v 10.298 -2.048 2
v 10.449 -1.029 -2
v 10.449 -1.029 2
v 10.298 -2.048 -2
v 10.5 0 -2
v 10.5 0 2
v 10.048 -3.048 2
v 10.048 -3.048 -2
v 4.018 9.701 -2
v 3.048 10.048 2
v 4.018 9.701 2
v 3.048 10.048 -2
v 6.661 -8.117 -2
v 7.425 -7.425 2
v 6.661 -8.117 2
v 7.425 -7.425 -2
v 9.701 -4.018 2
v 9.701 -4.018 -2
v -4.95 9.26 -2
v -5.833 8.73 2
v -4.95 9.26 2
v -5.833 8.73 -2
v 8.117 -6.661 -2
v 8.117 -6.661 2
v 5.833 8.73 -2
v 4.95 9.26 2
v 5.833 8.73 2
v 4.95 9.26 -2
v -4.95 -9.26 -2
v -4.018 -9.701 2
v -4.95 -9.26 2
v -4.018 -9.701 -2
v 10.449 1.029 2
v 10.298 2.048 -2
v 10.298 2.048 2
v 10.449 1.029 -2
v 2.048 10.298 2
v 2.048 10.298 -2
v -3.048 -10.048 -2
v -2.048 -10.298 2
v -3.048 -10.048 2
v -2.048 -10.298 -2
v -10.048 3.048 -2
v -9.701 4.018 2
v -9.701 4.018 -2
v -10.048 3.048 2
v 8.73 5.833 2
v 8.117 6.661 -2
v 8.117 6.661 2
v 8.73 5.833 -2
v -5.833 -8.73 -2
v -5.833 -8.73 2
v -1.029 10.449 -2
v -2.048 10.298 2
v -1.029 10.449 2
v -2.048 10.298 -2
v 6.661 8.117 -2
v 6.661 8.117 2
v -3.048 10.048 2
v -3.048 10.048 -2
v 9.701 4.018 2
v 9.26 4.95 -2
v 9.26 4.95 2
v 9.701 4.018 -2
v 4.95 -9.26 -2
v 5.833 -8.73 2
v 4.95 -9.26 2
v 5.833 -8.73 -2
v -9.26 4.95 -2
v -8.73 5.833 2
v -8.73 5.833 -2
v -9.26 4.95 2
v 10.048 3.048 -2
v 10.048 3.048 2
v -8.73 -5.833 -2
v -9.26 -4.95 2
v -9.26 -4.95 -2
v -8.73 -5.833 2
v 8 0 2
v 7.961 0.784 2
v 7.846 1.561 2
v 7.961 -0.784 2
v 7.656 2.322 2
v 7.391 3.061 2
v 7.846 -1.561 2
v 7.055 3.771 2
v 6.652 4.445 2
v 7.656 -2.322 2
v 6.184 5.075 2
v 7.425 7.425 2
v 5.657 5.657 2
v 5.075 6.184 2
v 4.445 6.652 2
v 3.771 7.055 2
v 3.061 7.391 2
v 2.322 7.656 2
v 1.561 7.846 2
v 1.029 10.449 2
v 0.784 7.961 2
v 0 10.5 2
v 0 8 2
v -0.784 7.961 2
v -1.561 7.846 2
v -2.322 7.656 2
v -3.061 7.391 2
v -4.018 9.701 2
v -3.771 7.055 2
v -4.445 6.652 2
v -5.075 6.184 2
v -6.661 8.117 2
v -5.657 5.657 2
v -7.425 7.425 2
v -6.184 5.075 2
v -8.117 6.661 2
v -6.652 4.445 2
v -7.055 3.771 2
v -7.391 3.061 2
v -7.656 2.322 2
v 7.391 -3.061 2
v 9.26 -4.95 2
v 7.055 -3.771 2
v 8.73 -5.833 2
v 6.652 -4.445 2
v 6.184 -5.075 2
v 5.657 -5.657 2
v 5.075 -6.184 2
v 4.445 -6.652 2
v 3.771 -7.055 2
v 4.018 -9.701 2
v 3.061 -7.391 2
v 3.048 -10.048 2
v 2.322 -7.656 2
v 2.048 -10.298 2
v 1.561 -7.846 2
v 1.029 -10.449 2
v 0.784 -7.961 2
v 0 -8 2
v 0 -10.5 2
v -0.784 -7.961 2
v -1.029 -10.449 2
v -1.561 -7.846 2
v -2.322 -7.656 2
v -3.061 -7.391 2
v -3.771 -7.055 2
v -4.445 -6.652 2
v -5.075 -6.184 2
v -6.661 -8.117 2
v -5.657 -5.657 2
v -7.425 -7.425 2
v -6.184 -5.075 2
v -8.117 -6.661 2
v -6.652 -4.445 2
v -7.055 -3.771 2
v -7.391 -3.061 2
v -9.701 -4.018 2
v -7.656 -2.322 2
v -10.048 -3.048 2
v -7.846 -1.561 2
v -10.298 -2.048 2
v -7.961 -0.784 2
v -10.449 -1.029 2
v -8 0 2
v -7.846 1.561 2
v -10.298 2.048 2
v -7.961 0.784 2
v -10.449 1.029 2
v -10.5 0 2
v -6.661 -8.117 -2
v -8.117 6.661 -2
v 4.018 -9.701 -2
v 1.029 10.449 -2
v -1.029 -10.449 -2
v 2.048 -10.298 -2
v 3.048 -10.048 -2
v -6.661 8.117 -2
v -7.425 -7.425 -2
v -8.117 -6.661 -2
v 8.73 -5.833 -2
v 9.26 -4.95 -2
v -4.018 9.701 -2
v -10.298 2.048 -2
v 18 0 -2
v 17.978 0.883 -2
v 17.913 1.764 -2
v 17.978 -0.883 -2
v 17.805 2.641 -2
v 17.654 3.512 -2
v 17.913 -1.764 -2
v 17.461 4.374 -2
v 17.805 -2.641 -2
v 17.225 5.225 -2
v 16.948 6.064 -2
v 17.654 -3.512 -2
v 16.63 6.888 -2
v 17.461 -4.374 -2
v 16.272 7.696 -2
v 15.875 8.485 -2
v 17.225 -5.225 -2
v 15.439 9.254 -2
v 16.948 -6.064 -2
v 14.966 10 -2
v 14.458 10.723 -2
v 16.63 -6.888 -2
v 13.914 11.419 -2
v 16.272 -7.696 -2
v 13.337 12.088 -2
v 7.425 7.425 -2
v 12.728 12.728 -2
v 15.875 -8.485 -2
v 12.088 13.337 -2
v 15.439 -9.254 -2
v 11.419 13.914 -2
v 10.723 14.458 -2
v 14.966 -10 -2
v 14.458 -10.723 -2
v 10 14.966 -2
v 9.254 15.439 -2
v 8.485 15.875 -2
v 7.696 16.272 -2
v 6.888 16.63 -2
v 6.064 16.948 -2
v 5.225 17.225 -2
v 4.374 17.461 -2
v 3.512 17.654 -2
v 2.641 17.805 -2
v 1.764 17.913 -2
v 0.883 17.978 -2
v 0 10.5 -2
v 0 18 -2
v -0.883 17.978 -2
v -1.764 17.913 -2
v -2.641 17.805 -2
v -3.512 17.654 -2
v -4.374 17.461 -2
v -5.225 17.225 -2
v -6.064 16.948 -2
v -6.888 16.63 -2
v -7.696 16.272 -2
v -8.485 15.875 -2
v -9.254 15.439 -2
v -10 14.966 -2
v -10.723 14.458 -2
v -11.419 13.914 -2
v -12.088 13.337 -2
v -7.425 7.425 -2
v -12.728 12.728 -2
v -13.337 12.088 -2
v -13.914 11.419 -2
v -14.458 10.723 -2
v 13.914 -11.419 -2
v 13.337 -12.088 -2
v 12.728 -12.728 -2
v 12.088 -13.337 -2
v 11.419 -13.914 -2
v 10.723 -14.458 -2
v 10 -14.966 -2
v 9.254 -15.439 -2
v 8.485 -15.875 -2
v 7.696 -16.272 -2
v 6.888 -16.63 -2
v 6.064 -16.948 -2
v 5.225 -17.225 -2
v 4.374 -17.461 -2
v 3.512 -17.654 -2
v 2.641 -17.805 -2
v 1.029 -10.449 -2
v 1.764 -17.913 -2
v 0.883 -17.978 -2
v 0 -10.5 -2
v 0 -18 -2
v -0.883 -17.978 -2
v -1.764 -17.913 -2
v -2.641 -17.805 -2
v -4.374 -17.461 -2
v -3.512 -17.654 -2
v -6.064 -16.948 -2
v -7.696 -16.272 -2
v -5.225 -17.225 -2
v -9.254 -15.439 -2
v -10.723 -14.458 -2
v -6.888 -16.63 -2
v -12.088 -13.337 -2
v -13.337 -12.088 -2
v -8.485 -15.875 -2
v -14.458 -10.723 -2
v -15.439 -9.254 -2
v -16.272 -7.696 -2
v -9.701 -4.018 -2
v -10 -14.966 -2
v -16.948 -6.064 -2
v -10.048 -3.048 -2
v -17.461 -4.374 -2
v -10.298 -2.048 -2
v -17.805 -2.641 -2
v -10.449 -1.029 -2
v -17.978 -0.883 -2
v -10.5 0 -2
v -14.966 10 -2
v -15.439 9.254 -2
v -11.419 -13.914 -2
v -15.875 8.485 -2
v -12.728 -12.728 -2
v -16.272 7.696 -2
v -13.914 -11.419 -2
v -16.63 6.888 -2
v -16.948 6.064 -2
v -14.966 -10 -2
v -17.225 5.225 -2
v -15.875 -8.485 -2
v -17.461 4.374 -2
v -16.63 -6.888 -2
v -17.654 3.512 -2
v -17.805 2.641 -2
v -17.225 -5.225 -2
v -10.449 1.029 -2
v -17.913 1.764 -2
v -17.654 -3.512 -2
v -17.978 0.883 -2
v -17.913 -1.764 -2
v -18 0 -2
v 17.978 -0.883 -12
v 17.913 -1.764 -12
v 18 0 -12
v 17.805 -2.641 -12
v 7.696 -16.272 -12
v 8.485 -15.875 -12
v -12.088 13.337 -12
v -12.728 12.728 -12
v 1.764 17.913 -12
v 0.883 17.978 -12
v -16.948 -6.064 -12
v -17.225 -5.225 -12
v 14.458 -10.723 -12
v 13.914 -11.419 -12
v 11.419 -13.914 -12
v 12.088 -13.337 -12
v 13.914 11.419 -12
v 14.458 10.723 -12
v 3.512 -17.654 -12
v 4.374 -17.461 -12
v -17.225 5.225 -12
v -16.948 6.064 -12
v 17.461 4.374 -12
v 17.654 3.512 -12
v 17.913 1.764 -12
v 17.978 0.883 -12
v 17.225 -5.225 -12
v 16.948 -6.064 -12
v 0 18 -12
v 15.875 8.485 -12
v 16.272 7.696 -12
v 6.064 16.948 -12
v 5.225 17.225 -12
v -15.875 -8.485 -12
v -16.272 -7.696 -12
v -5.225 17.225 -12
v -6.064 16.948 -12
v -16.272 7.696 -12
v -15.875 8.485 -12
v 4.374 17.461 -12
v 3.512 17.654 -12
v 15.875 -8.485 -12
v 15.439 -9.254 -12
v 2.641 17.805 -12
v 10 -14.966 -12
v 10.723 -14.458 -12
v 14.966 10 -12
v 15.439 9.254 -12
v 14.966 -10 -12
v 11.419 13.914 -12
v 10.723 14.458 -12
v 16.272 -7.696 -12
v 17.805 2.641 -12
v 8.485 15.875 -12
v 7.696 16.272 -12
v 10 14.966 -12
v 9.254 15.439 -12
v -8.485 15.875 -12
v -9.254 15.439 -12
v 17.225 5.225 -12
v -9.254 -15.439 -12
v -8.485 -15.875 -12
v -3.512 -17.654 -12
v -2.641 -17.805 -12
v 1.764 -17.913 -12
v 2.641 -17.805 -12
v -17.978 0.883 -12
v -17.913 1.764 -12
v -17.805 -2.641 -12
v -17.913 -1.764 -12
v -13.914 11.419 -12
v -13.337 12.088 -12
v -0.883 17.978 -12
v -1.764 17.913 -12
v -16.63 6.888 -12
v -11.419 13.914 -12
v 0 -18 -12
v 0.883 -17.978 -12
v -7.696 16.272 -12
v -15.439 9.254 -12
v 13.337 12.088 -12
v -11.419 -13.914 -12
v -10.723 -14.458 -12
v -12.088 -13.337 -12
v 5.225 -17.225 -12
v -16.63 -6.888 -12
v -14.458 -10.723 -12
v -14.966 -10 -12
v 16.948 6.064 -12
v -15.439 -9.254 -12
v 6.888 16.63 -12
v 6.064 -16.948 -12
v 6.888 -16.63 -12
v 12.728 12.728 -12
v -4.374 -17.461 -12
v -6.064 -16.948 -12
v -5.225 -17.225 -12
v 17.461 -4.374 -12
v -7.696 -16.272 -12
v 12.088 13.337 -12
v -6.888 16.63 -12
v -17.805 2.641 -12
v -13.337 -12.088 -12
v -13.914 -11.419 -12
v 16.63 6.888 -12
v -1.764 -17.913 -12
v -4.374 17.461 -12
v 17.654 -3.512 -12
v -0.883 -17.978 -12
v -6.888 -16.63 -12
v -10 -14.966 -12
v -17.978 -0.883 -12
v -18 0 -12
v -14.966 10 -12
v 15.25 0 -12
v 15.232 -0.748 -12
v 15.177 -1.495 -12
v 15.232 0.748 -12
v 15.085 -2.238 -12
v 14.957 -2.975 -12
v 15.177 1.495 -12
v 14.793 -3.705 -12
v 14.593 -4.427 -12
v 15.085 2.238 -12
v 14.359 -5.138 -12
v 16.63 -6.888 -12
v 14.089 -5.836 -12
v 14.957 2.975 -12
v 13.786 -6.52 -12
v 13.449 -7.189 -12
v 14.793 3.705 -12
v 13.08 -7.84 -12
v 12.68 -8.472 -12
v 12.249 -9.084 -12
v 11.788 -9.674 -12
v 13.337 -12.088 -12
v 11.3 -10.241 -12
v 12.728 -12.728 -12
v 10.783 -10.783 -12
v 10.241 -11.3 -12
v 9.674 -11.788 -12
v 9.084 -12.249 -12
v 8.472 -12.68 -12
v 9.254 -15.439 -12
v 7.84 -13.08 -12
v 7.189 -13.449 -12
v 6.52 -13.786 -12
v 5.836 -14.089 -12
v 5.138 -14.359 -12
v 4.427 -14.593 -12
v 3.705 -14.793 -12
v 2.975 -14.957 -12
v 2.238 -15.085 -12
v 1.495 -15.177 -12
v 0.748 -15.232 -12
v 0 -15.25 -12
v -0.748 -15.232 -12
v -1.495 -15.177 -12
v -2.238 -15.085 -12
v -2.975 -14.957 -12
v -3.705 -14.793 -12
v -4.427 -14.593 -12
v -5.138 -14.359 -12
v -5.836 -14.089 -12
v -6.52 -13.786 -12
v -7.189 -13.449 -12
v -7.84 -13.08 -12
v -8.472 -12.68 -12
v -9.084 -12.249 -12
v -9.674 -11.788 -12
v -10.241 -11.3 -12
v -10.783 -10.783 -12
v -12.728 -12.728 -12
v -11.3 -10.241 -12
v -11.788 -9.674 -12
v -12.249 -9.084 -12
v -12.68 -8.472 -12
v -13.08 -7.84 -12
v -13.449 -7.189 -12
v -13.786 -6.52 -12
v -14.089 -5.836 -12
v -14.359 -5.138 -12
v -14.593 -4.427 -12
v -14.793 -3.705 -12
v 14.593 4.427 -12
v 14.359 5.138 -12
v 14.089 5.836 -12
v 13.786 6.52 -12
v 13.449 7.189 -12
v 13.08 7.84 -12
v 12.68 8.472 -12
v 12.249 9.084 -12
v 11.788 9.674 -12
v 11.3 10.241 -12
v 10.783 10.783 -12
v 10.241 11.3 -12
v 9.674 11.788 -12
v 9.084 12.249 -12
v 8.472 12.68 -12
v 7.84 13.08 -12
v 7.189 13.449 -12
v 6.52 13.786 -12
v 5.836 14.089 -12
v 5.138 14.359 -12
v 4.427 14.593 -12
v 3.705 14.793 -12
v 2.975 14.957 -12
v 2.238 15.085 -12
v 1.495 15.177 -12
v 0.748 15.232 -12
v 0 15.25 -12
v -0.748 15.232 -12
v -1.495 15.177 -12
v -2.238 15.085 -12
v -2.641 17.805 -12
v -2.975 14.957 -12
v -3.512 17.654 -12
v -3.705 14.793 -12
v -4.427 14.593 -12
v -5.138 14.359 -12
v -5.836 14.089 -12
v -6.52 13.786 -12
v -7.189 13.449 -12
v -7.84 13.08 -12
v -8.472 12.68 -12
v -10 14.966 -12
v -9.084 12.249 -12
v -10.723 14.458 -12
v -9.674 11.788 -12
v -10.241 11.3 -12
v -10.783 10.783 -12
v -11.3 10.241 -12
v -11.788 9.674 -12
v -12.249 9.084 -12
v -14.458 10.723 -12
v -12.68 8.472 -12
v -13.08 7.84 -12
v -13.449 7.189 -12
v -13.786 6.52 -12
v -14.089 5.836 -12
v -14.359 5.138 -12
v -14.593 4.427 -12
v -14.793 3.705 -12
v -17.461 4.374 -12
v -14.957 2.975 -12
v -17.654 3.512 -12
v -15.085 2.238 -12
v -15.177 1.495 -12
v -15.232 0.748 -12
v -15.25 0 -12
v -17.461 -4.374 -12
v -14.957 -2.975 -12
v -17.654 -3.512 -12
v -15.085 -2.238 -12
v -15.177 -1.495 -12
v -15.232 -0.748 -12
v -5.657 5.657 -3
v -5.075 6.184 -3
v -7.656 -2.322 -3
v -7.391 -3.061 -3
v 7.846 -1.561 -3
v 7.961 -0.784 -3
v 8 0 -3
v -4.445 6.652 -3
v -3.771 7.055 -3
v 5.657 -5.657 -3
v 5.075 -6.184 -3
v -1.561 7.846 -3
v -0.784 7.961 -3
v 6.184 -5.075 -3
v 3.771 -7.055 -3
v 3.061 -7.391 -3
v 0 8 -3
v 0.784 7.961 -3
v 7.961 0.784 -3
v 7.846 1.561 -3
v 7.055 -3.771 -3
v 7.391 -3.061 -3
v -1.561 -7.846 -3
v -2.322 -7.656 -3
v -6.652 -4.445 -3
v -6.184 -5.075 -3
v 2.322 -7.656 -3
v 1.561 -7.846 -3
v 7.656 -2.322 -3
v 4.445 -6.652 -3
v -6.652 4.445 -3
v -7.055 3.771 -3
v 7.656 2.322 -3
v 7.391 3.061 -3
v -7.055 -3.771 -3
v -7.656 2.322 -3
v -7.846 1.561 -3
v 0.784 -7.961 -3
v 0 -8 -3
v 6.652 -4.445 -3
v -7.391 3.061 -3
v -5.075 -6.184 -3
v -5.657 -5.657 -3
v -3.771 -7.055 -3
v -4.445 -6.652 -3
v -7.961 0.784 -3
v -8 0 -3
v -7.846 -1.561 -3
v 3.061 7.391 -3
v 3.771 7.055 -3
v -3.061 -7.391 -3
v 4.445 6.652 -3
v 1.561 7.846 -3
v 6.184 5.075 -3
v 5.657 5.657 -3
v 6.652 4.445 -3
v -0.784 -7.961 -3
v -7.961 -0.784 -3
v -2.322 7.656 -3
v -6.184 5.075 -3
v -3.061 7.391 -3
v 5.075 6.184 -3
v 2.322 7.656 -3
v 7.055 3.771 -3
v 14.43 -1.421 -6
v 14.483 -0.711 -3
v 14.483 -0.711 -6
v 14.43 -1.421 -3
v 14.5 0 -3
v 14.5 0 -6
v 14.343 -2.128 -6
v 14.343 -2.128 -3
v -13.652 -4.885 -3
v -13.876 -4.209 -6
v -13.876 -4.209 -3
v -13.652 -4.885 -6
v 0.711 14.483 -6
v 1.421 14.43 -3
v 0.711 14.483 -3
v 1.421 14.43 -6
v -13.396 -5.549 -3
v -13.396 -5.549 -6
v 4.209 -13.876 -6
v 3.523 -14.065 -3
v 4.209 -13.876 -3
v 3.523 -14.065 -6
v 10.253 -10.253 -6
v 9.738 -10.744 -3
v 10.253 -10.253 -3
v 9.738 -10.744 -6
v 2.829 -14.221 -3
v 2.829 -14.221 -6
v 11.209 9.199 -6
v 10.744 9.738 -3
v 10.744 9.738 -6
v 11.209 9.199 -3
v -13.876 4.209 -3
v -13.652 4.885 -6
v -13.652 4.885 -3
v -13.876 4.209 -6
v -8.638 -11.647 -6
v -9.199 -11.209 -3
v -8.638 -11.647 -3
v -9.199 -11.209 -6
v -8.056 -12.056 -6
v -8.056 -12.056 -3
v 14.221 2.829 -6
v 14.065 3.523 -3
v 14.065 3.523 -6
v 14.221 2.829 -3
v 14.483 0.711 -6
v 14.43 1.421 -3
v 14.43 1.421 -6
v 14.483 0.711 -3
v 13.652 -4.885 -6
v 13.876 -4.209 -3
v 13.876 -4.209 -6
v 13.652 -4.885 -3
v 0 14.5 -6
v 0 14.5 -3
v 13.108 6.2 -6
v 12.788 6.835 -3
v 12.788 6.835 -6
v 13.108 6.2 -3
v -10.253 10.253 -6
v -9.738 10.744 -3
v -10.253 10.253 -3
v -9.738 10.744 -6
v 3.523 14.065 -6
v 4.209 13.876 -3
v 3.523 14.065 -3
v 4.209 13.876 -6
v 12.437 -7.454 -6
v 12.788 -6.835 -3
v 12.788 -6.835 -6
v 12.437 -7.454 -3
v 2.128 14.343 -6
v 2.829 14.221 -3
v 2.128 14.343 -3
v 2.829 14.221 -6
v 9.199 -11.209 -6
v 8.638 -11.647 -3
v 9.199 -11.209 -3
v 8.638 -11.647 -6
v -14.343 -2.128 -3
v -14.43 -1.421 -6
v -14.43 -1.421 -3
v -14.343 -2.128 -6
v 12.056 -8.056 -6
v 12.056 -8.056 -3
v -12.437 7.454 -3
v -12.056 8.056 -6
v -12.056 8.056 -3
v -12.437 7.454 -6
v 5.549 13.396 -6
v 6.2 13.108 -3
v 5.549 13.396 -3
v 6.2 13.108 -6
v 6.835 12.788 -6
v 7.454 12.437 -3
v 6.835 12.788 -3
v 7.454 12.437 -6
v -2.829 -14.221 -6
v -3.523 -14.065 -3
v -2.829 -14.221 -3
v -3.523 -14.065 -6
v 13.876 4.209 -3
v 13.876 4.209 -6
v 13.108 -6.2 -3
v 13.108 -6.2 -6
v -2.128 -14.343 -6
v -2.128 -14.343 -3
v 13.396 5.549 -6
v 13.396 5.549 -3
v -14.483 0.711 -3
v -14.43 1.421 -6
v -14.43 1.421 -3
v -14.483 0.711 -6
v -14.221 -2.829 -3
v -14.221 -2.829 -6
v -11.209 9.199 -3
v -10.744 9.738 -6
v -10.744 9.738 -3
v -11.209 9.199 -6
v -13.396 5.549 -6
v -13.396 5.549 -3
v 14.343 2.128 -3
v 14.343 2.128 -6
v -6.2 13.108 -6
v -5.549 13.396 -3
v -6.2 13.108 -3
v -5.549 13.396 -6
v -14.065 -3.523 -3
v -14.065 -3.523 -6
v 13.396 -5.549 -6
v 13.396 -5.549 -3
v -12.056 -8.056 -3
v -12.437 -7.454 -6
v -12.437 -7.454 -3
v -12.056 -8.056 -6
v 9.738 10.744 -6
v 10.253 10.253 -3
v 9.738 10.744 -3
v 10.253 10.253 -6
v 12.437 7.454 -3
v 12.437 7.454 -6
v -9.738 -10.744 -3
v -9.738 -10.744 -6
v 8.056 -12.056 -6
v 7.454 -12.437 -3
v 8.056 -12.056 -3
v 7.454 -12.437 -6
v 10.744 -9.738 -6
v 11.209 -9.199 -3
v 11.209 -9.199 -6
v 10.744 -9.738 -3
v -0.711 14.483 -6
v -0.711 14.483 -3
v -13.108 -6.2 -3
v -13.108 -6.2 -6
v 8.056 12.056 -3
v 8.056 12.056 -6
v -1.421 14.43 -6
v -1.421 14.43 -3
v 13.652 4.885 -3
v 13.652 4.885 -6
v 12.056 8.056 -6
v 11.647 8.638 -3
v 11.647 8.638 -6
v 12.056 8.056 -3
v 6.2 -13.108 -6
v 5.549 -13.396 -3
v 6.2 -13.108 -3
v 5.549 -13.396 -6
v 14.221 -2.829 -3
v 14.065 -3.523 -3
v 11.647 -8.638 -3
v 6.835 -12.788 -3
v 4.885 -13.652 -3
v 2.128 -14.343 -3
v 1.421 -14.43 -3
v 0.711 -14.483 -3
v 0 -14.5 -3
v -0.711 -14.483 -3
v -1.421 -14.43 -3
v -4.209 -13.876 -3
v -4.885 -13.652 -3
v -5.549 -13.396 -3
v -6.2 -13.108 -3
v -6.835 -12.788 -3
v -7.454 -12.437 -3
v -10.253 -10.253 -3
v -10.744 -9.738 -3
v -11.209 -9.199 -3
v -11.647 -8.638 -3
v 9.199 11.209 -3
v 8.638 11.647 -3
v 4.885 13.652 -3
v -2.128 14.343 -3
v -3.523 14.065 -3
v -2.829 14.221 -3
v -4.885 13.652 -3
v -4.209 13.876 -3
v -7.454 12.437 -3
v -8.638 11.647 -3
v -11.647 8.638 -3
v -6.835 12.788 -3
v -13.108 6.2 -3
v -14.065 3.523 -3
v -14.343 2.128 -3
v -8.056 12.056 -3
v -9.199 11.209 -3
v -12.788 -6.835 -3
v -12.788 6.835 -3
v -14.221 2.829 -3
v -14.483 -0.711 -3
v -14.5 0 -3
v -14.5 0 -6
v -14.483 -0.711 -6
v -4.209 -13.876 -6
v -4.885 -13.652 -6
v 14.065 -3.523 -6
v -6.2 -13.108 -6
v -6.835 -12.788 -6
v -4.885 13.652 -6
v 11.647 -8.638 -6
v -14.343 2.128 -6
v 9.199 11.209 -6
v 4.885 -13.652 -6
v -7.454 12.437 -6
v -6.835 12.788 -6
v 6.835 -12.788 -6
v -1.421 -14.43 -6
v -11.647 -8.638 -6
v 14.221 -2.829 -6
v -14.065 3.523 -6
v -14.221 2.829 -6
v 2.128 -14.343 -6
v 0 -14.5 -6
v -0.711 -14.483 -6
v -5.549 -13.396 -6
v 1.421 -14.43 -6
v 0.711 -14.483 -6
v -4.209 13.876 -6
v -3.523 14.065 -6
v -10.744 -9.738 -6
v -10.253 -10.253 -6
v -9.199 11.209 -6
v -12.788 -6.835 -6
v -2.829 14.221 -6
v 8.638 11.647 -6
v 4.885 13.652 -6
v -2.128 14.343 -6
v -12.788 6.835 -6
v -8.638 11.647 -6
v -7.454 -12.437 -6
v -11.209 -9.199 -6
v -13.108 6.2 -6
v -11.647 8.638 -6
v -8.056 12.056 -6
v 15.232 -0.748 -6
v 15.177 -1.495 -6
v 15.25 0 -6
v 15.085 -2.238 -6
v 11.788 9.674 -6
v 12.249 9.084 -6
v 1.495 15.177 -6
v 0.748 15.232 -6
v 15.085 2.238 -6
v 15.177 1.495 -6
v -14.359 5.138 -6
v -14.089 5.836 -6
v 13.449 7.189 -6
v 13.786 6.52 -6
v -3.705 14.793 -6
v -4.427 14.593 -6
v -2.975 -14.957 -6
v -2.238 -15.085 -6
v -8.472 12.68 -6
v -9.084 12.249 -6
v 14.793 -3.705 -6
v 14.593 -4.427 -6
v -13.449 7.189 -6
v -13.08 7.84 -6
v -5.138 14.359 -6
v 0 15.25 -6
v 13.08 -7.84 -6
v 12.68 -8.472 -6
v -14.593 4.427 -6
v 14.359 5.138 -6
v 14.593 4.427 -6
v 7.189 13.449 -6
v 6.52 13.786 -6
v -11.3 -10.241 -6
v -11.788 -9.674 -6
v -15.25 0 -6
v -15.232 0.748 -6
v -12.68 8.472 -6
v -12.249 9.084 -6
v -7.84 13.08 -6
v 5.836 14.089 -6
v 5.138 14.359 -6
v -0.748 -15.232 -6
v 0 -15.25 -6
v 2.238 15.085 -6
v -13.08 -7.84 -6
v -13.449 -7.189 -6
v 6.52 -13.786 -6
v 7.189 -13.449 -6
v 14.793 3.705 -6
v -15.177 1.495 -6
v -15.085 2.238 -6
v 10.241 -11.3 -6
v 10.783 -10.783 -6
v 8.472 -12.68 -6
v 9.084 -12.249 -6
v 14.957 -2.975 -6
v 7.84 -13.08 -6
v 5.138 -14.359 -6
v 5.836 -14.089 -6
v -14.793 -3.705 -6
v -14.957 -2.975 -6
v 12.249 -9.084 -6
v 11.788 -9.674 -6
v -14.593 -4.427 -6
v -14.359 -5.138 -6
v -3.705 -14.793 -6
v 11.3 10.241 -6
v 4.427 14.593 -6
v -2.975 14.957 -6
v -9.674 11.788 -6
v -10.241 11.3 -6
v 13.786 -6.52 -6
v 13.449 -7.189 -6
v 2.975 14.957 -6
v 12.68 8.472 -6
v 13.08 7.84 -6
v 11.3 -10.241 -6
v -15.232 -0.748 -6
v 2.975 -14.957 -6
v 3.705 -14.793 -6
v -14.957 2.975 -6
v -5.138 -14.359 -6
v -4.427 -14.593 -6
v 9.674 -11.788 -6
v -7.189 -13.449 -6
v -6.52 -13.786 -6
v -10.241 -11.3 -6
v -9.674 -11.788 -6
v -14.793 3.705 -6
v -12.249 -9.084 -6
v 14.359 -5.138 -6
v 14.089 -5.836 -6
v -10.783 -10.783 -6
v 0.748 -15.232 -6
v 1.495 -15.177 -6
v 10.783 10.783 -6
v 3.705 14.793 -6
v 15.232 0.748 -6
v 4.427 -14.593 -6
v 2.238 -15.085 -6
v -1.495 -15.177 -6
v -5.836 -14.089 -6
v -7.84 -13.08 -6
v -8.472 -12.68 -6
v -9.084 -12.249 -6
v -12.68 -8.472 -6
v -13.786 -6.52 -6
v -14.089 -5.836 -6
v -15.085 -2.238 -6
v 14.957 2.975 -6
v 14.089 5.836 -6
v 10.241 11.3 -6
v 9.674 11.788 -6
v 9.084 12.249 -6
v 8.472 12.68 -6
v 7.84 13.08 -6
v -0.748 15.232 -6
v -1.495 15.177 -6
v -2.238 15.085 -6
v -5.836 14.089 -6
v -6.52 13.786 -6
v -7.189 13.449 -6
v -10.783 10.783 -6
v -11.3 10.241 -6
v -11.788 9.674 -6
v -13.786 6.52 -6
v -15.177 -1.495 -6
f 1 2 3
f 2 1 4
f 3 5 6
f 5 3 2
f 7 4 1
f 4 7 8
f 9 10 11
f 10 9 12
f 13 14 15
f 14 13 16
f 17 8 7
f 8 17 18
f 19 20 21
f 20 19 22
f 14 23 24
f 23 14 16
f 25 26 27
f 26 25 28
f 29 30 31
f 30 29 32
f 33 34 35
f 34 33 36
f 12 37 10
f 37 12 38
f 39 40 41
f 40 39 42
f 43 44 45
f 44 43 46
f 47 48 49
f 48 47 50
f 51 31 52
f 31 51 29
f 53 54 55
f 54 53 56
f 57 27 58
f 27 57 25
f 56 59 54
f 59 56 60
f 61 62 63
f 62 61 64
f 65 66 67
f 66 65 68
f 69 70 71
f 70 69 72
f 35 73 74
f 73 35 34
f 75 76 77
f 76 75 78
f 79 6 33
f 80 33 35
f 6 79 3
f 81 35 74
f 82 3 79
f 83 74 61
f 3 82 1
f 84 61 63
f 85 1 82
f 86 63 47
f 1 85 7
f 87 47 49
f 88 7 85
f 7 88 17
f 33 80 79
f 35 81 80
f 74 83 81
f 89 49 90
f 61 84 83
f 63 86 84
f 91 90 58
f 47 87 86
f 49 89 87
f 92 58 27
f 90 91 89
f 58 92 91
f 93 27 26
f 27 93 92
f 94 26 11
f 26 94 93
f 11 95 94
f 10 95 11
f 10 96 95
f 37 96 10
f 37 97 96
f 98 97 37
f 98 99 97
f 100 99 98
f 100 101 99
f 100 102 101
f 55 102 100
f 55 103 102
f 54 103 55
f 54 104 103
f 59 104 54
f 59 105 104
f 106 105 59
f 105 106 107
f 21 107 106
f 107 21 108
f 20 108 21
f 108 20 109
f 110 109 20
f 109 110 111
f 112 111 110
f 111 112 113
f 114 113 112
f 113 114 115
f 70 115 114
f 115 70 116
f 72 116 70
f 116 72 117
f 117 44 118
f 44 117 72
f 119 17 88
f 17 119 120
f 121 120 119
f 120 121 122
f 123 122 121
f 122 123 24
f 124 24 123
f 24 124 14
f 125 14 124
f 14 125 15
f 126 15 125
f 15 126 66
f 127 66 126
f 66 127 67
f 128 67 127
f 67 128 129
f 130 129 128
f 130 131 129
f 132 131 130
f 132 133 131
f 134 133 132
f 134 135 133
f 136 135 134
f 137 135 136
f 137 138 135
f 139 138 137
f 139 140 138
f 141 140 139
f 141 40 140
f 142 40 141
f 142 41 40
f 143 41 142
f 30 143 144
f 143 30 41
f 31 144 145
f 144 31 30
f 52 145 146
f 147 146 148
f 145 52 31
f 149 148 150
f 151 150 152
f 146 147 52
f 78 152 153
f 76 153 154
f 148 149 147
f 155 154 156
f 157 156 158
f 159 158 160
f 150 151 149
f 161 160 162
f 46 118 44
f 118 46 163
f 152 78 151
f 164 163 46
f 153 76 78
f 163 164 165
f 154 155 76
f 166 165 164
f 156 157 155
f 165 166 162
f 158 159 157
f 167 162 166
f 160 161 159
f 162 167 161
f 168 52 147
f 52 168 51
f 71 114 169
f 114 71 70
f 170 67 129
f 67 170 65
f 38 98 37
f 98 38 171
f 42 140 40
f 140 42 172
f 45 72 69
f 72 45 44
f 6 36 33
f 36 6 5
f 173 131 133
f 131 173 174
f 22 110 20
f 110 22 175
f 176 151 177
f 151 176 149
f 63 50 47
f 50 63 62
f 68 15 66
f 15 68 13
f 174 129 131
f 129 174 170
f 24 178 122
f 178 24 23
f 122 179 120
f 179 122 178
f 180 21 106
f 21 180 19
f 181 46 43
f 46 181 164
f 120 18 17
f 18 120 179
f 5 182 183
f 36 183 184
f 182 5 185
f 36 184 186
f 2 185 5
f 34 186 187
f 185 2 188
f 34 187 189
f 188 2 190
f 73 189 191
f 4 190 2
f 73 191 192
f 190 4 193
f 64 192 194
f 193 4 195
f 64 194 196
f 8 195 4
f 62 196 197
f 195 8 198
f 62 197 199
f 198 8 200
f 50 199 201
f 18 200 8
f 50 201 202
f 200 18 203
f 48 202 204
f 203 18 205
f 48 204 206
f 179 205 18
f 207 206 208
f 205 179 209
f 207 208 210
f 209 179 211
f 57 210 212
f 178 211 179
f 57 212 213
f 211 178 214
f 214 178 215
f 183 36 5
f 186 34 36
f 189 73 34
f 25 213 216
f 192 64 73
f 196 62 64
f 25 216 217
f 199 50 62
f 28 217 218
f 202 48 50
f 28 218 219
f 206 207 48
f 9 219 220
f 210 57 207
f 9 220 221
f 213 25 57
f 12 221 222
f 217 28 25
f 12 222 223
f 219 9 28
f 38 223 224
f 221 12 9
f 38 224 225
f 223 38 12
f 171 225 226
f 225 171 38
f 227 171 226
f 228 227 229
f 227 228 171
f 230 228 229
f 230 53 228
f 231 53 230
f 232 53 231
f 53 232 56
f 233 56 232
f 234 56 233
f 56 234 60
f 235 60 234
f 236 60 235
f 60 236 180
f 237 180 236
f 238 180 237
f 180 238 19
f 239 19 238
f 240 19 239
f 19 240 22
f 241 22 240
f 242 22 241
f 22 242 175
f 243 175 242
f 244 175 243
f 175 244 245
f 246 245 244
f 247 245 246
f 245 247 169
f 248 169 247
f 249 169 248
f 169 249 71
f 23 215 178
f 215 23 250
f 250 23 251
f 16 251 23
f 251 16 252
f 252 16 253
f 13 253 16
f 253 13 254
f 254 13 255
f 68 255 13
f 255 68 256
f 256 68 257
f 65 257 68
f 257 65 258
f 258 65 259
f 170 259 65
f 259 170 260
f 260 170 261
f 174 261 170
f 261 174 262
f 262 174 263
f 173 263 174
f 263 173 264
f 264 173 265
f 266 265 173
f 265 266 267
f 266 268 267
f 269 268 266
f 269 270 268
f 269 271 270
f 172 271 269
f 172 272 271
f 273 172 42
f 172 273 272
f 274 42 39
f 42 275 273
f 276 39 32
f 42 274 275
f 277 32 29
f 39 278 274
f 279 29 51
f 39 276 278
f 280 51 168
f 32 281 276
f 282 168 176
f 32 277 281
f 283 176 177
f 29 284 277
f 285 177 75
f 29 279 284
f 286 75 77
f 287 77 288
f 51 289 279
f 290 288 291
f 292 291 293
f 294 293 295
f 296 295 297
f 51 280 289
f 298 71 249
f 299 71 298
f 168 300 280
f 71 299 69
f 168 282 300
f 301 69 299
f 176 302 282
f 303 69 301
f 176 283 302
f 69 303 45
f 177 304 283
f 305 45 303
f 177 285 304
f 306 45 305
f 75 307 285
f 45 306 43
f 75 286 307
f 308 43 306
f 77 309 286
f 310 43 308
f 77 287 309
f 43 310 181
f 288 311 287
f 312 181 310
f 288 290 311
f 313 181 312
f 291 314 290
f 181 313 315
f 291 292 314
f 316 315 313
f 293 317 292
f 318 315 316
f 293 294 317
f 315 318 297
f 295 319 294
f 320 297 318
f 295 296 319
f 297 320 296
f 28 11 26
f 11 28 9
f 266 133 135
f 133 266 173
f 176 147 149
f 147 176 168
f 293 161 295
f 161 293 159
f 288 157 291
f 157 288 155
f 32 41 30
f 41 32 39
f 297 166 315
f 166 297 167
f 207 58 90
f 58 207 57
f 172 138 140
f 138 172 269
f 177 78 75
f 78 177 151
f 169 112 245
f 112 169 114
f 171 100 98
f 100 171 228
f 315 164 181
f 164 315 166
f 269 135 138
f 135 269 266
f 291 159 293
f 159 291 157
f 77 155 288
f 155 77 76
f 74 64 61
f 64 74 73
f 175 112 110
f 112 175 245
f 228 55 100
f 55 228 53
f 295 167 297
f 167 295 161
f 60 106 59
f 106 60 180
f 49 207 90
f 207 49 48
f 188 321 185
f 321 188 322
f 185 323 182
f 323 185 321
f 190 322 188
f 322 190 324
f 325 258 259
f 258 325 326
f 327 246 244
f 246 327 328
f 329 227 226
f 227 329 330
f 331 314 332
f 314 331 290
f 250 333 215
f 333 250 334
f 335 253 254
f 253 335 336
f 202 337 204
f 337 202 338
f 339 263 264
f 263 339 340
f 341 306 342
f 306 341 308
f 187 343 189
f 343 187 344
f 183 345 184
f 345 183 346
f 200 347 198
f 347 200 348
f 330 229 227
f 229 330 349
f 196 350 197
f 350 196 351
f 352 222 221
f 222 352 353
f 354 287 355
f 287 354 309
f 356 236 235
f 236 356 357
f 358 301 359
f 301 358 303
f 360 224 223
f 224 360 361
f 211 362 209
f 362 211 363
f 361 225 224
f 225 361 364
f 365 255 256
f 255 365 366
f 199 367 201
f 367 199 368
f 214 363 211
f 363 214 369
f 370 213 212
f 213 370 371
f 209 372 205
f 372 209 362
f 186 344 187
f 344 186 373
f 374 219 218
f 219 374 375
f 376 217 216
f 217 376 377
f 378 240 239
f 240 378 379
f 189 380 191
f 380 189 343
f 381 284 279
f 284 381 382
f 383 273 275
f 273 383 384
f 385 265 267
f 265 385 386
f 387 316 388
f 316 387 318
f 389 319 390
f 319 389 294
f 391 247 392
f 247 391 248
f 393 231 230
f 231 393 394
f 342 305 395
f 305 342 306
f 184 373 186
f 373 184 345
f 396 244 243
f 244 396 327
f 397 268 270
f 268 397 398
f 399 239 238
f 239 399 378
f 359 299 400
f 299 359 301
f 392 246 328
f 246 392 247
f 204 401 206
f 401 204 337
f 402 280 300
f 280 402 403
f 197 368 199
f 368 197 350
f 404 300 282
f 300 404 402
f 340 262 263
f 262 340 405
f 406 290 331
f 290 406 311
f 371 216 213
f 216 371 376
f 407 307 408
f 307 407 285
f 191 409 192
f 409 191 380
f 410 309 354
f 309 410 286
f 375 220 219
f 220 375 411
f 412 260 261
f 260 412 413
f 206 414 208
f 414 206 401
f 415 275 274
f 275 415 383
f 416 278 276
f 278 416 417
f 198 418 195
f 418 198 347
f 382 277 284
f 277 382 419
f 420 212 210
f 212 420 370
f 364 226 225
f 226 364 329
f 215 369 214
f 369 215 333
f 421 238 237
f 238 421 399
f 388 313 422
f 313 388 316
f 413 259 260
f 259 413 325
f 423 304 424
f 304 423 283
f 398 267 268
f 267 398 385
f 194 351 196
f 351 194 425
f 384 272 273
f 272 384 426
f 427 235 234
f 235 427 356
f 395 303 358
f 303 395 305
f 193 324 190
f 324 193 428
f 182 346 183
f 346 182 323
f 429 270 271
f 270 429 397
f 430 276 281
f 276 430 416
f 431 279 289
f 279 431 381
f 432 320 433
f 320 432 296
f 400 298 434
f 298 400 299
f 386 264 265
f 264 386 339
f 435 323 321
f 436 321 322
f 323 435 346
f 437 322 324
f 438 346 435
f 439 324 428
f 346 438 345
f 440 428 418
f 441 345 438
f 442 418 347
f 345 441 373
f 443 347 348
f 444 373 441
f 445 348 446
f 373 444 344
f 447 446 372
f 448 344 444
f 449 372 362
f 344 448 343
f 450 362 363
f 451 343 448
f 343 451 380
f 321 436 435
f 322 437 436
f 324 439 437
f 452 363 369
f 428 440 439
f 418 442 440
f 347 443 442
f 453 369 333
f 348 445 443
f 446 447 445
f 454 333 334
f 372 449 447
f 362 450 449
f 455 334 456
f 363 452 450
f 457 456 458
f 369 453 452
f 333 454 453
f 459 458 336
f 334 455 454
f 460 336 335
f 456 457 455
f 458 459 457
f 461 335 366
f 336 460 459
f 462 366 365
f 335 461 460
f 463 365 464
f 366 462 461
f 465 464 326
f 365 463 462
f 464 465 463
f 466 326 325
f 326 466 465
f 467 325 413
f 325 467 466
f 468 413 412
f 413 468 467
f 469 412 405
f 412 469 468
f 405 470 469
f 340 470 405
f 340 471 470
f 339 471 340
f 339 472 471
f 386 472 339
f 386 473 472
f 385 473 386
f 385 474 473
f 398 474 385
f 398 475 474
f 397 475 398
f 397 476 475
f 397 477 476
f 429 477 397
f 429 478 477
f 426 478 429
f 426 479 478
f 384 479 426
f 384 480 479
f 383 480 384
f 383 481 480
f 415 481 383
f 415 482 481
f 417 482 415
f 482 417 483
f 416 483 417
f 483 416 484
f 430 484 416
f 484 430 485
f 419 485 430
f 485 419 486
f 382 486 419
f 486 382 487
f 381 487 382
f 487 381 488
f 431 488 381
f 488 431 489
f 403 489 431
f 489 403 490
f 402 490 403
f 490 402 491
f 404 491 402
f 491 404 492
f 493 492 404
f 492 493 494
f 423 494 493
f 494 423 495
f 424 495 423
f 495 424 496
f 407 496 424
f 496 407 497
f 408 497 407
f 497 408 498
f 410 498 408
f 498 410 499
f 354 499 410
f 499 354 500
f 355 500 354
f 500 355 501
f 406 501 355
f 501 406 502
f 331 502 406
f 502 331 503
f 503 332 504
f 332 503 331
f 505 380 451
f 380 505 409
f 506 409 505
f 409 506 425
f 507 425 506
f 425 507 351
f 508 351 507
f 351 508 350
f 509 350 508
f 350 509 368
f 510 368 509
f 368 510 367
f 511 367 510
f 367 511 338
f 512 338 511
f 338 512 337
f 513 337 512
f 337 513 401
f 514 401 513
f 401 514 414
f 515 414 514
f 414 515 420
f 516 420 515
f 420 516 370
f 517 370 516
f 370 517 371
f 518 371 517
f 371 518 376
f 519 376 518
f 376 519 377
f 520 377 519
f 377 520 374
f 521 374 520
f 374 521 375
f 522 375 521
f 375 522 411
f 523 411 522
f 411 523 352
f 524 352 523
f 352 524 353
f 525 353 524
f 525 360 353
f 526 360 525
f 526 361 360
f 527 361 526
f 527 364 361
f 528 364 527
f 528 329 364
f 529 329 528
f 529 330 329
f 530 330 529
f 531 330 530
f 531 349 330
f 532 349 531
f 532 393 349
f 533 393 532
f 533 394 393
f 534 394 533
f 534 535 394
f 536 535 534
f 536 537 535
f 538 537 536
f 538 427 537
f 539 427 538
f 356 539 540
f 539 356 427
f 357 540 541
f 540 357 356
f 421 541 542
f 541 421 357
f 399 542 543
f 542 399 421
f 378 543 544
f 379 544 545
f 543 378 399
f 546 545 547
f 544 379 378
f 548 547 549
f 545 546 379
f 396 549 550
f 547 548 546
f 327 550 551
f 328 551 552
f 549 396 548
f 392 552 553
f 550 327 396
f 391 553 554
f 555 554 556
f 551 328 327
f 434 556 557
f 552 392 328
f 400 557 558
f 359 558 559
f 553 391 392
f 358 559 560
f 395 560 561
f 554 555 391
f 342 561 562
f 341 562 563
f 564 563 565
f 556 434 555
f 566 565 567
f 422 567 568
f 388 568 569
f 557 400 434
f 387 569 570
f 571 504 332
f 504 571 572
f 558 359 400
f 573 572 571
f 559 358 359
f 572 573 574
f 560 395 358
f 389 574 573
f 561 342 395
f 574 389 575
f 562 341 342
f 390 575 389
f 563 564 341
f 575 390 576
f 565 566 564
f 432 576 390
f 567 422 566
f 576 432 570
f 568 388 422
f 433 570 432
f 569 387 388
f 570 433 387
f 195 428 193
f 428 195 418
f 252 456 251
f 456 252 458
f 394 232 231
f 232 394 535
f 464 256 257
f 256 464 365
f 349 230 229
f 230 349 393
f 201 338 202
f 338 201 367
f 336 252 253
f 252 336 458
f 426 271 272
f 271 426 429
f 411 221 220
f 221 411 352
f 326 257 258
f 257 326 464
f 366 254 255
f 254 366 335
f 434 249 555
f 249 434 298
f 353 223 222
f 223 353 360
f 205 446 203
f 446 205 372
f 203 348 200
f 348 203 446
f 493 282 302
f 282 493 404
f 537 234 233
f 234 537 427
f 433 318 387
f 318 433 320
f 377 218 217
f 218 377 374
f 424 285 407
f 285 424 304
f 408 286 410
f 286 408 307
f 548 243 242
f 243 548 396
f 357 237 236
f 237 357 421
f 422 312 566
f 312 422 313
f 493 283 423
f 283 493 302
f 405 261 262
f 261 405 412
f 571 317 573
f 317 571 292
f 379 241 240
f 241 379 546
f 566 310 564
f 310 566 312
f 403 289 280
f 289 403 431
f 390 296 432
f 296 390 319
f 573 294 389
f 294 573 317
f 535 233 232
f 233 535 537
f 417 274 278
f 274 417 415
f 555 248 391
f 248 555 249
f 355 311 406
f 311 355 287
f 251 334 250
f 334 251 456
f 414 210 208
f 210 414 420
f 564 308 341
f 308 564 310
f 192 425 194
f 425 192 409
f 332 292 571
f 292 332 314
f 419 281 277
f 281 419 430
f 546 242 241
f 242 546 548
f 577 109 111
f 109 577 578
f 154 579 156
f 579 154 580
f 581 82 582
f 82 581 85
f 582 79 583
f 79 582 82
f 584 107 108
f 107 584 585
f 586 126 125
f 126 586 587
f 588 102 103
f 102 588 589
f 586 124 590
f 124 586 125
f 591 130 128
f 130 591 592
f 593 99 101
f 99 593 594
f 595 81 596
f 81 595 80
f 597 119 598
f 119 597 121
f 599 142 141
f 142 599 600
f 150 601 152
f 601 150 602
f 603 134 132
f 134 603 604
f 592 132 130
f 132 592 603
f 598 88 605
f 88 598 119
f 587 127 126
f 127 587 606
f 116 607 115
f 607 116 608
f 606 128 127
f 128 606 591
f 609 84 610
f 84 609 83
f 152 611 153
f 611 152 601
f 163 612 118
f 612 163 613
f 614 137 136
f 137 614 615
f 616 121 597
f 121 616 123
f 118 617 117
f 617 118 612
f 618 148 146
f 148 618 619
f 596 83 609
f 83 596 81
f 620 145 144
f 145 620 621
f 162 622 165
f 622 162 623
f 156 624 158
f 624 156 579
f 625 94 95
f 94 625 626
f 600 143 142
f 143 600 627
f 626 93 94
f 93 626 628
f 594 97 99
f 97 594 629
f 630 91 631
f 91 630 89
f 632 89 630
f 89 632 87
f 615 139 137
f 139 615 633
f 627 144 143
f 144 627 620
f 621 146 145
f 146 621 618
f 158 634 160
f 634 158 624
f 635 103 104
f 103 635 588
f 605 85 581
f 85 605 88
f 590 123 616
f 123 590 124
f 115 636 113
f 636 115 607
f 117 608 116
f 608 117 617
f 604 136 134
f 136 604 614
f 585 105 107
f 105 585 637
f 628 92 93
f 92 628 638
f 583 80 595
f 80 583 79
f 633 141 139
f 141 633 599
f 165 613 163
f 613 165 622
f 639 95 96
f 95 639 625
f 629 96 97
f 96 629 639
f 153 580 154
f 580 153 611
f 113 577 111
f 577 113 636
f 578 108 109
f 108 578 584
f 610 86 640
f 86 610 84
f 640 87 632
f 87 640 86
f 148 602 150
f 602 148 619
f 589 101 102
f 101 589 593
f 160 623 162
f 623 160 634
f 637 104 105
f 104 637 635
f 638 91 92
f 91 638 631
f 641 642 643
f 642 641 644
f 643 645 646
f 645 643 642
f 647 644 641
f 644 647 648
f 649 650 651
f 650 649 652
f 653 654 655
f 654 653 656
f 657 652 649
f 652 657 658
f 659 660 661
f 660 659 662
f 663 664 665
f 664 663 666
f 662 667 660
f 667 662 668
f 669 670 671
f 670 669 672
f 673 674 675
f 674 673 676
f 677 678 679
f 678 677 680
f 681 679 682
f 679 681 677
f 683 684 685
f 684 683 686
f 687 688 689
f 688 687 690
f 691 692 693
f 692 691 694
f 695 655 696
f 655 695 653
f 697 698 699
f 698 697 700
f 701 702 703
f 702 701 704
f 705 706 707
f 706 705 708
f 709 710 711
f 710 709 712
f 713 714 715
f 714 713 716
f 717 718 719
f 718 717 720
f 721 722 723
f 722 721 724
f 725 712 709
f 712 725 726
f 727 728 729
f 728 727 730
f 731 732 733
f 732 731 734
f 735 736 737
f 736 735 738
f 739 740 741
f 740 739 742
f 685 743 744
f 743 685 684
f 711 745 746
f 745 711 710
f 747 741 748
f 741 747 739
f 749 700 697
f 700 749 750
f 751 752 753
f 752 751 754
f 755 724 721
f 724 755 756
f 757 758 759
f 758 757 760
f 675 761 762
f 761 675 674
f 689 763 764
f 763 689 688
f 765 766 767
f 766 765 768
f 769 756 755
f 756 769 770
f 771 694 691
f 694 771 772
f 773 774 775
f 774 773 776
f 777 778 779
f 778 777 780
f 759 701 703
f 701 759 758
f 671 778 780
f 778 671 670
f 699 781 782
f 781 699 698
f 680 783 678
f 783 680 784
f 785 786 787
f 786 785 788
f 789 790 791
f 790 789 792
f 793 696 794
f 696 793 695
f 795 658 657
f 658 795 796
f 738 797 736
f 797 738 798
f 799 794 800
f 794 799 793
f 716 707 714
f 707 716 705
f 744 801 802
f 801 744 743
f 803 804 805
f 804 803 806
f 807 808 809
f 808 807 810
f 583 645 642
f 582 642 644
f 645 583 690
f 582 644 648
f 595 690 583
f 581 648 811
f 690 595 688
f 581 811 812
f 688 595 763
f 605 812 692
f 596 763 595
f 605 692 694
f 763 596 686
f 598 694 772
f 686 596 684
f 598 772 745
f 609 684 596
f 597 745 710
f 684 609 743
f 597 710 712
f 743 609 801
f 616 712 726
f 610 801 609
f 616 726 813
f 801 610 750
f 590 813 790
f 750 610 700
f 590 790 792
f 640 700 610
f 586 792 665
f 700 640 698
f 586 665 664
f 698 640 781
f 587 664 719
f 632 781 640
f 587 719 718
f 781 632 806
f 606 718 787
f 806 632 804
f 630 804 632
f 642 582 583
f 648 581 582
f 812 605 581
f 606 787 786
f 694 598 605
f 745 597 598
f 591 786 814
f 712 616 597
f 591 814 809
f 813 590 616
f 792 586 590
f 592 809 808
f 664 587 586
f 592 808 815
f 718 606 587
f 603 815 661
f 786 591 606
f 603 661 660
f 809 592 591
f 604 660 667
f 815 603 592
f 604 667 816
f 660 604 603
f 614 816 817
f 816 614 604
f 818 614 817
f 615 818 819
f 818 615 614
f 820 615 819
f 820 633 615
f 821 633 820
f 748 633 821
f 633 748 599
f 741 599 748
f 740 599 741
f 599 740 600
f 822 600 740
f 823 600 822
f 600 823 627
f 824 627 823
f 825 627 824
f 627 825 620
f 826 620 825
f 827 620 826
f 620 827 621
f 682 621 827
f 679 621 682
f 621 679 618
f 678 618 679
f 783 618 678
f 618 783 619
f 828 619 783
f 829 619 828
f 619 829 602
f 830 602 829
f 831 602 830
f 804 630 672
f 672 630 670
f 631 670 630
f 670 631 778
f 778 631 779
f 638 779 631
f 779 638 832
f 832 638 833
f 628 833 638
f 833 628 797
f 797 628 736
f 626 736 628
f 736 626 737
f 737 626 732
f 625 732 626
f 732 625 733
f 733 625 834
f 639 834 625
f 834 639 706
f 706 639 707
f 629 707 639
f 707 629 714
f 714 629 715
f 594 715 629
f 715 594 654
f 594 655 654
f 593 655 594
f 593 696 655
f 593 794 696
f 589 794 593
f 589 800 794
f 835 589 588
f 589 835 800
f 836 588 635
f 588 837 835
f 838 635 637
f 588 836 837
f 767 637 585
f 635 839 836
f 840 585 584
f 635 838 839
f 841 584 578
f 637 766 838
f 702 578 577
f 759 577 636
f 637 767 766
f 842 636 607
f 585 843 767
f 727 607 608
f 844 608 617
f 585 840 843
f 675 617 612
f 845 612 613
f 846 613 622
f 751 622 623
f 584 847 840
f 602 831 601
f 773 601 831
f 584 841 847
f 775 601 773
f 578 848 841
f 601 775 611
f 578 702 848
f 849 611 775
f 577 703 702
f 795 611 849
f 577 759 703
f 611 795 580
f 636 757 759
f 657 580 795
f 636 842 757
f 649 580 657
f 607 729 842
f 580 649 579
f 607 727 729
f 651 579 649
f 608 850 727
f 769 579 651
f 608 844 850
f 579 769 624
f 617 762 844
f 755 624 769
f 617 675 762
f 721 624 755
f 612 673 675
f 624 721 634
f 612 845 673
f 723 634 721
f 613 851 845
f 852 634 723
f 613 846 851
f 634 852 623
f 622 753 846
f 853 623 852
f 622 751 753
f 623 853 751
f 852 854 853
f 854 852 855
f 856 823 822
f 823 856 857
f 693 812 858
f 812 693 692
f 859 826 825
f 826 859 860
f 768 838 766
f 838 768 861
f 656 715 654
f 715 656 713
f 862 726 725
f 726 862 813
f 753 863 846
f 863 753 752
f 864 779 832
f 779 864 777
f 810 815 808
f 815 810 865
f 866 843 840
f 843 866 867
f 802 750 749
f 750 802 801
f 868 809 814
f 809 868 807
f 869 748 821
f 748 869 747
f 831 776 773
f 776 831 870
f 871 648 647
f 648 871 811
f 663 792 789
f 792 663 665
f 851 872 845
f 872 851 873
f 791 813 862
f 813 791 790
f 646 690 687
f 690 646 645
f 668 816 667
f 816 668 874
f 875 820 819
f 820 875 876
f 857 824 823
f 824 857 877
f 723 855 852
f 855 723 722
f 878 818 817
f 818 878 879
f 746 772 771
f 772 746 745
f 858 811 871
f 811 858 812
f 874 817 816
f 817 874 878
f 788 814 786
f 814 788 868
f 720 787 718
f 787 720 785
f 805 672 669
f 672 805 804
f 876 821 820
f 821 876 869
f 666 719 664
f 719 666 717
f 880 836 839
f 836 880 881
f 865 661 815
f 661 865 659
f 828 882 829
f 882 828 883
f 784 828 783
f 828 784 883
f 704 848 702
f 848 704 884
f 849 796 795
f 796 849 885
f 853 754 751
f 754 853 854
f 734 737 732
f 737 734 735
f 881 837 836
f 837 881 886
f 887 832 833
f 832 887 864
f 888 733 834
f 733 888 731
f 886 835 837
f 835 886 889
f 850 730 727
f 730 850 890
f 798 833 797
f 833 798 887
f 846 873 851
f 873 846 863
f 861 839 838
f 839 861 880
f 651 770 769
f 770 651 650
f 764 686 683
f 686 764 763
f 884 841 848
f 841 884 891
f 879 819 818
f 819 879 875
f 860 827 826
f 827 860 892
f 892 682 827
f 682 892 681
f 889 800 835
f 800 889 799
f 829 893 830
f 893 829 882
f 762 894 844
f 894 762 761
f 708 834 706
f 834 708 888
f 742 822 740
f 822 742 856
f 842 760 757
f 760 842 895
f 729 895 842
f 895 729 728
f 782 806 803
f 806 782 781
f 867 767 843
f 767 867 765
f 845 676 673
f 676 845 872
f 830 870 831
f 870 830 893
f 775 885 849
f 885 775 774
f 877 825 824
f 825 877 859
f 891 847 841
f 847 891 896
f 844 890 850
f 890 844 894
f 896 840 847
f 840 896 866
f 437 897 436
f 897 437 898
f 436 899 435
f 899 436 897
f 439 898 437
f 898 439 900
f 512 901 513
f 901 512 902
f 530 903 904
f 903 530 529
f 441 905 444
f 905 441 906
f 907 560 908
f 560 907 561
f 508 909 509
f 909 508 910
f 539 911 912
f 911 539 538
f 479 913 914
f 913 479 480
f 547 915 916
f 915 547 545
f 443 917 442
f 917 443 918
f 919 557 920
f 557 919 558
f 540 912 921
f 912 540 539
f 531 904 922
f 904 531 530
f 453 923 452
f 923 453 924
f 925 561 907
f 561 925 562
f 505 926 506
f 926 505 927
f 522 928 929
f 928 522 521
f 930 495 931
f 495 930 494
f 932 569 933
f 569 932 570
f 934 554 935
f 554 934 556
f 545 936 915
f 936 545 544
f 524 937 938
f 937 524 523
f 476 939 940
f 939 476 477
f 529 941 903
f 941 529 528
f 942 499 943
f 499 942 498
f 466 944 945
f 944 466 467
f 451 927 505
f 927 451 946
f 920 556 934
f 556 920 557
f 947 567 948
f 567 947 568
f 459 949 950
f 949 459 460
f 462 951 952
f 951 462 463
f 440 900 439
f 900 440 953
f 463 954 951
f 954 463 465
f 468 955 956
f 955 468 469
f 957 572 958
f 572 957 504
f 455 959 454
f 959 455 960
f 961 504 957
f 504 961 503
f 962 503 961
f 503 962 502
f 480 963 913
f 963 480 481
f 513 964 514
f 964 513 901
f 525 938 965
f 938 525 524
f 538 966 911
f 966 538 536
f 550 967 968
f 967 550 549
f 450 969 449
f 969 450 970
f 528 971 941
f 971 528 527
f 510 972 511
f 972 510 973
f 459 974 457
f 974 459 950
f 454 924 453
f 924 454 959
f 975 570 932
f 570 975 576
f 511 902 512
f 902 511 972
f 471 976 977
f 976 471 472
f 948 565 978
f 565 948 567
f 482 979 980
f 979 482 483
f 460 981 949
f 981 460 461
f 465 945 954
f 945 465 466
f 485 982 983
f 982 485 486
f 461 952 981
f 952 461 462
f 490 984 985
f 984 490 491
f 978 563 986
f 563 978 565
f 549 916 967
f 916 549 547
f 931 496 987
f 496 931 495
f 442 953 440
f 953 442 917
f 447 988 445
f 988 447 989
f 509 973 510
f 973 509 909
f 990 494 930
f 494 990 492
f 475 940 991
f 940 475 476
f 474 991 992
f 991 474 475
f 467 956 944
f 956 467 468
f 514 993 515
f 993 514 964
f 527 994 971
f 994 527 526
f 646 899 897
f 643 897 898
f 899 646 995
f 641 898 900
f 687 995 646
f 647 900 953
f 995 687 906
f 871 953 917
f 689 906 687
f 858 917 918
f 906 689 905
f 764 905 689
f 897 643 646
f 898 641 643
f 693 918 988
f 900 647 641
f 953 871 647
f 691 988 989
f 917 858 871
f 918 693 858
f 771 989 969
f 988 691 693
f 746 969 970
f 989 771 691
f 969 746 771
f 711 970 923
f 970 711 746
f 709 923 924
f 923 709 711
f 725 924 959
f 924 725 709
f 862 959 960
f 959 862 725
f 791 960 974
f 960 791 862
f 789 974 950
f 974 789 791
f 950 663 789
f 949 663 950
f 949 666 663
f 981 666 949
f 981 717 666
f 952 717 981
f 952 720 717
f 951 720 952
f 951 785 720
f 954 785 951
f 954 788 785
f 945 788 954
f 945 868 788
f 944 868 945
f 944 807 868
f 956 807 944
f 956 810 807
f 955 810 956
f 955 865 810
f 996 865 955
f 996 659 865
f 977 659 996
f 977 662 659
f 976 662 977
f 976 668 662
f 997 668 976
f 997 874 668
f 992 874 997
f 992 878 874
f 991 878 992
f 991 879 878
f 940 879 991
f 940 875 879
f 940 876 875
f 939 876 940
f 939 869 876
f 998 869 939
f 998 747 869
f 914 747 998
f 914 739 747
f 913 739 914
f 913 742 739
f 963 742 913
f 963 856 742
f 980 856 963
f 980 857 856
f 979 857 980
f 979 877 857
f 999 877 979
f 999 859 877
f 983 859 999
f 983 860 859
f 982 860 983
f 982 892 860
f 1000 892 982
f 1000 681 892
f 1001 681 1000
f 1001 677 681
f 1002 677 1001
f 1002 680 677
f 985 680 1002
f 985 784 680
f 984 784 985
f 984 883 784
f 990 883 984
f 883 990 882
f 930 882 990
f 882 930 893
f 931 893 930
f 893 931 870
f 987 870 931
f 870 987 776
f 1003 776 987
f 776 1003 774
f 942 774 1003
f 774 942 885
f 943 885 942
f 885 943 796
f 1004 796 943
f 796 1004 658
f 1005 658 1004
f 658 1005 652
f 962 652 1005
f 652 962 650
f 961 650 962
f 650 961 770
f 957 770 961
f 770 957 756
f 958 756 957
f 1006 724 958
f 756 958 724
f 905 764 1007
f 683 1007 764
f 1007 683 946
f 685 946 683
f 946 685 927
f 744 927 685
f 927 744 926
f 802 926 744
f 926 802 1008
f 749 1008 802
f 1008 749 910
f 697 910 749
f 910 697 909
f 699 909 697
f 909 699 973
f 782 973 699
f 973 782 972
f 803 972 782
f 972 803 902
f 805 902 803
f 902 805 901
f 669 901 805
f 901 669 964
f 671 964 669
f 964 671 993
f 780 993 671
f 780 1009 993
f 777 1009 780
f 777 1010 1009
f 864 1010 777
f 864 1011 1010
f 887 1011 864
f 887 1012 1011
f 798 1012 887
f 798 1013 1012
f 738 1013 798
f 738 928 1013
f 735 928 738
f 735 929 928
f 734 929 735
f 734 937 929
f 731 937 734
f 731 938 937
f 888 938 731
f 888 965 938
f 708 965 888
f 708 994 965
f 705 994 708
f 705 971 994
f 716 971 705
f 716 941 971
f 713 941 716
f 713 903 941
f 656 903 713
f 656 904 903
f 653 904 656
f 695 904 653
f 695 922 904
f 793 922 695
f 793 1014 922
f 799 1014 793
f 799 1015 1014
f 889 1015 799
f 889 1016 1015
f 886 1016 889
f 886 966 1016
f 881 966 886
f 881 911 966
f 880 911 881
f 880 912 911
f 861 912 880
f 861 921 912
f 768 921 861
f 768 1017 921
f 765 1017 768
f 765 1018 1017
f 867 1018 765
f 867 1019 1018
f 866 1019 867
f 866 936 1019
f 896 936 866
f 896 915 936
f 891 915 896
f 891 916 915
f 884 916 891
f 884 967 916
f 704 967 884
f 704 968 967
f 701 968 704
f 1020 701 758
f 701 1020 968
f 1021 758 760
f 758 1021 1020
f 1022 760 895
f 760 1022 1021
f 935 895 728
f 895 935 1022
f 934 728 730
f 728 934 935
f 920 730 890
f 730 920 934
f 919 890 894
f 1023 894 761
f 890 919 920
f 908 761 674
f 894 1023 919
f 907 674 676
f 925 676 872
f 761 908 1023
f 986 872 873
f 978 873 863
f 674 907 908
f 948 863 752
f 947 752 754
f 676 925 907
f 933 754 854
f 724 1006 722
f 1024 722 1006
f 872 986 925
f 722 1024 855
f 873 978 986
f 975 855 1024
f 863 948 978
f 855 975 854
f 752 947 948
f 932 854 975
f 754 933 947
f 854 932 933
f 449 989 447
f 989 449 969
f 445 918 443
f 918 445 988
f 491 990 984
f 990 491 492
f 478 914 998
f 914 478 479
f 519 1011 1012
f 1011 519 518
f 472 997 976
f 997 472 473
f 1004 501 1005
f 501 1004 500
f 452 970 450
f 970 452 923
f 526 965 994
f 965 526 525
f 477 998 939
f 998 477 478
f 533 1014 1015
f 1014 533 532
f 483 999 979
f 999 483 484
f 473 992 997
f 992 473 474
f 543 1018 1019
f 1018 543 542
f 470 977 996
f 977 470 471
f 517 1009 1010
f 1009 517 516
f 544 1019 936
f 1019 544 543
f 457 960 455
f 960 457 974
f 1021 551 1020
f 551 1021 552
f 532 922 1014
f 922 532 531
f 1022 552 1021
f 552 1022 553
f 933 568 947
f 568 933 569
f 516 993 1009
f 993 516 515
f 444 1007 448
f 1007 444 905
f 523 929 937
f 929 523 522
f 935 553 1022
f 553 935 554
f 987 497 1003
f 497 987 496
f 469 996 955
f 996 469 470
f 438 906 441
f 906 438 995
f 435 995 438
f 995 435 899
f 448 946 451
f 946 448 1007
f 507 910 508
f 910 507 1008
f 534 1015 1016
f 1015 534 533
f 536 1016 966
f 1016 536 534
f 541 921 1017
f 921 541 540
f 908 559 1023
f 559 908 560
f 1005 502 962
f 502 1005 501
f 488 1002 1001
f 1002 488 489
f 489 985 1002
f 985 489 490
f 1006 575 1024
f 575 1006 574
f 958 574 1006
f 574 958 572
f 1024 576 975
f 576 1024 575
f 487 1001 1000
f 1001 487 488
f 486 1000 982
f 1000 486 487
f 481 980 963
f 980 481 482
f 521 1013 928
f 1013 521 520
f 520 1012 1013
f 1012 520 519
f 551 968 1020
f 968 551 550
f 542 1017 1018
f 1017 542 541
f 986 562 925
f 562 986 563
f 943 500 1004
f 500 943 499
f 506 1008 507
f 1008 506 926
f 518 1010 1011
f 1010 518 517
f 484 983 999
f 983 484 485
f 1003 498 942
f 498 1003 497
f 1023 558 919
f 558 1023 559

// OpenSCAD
module cap() {
difference() {
  union() {
   cylinder(r=10.5,h=4,center=true,$fn=64);
   translate([0,0,7])
    cylinder(r=18,h=10,center=true,$fn=128);

  }
  cylinder(r=8,h=8,center=true,$fn=64);
  translate([0,0,7])
      cylinder(r=14.5,h=8,center=true,$fn=128);
   translate([0,0,10])
      cylinder(r=15.25,h=8,center=true,$fn=128);
}
//translate([0,0,-1])
//difference() {
  //  cylinder(r=20,h=6,center=true,$fn=48);
  //    cylinder(r=17,h=8,center=true,$fn=48);
//}
}

rotate([180,0,0]) 
   cap();
